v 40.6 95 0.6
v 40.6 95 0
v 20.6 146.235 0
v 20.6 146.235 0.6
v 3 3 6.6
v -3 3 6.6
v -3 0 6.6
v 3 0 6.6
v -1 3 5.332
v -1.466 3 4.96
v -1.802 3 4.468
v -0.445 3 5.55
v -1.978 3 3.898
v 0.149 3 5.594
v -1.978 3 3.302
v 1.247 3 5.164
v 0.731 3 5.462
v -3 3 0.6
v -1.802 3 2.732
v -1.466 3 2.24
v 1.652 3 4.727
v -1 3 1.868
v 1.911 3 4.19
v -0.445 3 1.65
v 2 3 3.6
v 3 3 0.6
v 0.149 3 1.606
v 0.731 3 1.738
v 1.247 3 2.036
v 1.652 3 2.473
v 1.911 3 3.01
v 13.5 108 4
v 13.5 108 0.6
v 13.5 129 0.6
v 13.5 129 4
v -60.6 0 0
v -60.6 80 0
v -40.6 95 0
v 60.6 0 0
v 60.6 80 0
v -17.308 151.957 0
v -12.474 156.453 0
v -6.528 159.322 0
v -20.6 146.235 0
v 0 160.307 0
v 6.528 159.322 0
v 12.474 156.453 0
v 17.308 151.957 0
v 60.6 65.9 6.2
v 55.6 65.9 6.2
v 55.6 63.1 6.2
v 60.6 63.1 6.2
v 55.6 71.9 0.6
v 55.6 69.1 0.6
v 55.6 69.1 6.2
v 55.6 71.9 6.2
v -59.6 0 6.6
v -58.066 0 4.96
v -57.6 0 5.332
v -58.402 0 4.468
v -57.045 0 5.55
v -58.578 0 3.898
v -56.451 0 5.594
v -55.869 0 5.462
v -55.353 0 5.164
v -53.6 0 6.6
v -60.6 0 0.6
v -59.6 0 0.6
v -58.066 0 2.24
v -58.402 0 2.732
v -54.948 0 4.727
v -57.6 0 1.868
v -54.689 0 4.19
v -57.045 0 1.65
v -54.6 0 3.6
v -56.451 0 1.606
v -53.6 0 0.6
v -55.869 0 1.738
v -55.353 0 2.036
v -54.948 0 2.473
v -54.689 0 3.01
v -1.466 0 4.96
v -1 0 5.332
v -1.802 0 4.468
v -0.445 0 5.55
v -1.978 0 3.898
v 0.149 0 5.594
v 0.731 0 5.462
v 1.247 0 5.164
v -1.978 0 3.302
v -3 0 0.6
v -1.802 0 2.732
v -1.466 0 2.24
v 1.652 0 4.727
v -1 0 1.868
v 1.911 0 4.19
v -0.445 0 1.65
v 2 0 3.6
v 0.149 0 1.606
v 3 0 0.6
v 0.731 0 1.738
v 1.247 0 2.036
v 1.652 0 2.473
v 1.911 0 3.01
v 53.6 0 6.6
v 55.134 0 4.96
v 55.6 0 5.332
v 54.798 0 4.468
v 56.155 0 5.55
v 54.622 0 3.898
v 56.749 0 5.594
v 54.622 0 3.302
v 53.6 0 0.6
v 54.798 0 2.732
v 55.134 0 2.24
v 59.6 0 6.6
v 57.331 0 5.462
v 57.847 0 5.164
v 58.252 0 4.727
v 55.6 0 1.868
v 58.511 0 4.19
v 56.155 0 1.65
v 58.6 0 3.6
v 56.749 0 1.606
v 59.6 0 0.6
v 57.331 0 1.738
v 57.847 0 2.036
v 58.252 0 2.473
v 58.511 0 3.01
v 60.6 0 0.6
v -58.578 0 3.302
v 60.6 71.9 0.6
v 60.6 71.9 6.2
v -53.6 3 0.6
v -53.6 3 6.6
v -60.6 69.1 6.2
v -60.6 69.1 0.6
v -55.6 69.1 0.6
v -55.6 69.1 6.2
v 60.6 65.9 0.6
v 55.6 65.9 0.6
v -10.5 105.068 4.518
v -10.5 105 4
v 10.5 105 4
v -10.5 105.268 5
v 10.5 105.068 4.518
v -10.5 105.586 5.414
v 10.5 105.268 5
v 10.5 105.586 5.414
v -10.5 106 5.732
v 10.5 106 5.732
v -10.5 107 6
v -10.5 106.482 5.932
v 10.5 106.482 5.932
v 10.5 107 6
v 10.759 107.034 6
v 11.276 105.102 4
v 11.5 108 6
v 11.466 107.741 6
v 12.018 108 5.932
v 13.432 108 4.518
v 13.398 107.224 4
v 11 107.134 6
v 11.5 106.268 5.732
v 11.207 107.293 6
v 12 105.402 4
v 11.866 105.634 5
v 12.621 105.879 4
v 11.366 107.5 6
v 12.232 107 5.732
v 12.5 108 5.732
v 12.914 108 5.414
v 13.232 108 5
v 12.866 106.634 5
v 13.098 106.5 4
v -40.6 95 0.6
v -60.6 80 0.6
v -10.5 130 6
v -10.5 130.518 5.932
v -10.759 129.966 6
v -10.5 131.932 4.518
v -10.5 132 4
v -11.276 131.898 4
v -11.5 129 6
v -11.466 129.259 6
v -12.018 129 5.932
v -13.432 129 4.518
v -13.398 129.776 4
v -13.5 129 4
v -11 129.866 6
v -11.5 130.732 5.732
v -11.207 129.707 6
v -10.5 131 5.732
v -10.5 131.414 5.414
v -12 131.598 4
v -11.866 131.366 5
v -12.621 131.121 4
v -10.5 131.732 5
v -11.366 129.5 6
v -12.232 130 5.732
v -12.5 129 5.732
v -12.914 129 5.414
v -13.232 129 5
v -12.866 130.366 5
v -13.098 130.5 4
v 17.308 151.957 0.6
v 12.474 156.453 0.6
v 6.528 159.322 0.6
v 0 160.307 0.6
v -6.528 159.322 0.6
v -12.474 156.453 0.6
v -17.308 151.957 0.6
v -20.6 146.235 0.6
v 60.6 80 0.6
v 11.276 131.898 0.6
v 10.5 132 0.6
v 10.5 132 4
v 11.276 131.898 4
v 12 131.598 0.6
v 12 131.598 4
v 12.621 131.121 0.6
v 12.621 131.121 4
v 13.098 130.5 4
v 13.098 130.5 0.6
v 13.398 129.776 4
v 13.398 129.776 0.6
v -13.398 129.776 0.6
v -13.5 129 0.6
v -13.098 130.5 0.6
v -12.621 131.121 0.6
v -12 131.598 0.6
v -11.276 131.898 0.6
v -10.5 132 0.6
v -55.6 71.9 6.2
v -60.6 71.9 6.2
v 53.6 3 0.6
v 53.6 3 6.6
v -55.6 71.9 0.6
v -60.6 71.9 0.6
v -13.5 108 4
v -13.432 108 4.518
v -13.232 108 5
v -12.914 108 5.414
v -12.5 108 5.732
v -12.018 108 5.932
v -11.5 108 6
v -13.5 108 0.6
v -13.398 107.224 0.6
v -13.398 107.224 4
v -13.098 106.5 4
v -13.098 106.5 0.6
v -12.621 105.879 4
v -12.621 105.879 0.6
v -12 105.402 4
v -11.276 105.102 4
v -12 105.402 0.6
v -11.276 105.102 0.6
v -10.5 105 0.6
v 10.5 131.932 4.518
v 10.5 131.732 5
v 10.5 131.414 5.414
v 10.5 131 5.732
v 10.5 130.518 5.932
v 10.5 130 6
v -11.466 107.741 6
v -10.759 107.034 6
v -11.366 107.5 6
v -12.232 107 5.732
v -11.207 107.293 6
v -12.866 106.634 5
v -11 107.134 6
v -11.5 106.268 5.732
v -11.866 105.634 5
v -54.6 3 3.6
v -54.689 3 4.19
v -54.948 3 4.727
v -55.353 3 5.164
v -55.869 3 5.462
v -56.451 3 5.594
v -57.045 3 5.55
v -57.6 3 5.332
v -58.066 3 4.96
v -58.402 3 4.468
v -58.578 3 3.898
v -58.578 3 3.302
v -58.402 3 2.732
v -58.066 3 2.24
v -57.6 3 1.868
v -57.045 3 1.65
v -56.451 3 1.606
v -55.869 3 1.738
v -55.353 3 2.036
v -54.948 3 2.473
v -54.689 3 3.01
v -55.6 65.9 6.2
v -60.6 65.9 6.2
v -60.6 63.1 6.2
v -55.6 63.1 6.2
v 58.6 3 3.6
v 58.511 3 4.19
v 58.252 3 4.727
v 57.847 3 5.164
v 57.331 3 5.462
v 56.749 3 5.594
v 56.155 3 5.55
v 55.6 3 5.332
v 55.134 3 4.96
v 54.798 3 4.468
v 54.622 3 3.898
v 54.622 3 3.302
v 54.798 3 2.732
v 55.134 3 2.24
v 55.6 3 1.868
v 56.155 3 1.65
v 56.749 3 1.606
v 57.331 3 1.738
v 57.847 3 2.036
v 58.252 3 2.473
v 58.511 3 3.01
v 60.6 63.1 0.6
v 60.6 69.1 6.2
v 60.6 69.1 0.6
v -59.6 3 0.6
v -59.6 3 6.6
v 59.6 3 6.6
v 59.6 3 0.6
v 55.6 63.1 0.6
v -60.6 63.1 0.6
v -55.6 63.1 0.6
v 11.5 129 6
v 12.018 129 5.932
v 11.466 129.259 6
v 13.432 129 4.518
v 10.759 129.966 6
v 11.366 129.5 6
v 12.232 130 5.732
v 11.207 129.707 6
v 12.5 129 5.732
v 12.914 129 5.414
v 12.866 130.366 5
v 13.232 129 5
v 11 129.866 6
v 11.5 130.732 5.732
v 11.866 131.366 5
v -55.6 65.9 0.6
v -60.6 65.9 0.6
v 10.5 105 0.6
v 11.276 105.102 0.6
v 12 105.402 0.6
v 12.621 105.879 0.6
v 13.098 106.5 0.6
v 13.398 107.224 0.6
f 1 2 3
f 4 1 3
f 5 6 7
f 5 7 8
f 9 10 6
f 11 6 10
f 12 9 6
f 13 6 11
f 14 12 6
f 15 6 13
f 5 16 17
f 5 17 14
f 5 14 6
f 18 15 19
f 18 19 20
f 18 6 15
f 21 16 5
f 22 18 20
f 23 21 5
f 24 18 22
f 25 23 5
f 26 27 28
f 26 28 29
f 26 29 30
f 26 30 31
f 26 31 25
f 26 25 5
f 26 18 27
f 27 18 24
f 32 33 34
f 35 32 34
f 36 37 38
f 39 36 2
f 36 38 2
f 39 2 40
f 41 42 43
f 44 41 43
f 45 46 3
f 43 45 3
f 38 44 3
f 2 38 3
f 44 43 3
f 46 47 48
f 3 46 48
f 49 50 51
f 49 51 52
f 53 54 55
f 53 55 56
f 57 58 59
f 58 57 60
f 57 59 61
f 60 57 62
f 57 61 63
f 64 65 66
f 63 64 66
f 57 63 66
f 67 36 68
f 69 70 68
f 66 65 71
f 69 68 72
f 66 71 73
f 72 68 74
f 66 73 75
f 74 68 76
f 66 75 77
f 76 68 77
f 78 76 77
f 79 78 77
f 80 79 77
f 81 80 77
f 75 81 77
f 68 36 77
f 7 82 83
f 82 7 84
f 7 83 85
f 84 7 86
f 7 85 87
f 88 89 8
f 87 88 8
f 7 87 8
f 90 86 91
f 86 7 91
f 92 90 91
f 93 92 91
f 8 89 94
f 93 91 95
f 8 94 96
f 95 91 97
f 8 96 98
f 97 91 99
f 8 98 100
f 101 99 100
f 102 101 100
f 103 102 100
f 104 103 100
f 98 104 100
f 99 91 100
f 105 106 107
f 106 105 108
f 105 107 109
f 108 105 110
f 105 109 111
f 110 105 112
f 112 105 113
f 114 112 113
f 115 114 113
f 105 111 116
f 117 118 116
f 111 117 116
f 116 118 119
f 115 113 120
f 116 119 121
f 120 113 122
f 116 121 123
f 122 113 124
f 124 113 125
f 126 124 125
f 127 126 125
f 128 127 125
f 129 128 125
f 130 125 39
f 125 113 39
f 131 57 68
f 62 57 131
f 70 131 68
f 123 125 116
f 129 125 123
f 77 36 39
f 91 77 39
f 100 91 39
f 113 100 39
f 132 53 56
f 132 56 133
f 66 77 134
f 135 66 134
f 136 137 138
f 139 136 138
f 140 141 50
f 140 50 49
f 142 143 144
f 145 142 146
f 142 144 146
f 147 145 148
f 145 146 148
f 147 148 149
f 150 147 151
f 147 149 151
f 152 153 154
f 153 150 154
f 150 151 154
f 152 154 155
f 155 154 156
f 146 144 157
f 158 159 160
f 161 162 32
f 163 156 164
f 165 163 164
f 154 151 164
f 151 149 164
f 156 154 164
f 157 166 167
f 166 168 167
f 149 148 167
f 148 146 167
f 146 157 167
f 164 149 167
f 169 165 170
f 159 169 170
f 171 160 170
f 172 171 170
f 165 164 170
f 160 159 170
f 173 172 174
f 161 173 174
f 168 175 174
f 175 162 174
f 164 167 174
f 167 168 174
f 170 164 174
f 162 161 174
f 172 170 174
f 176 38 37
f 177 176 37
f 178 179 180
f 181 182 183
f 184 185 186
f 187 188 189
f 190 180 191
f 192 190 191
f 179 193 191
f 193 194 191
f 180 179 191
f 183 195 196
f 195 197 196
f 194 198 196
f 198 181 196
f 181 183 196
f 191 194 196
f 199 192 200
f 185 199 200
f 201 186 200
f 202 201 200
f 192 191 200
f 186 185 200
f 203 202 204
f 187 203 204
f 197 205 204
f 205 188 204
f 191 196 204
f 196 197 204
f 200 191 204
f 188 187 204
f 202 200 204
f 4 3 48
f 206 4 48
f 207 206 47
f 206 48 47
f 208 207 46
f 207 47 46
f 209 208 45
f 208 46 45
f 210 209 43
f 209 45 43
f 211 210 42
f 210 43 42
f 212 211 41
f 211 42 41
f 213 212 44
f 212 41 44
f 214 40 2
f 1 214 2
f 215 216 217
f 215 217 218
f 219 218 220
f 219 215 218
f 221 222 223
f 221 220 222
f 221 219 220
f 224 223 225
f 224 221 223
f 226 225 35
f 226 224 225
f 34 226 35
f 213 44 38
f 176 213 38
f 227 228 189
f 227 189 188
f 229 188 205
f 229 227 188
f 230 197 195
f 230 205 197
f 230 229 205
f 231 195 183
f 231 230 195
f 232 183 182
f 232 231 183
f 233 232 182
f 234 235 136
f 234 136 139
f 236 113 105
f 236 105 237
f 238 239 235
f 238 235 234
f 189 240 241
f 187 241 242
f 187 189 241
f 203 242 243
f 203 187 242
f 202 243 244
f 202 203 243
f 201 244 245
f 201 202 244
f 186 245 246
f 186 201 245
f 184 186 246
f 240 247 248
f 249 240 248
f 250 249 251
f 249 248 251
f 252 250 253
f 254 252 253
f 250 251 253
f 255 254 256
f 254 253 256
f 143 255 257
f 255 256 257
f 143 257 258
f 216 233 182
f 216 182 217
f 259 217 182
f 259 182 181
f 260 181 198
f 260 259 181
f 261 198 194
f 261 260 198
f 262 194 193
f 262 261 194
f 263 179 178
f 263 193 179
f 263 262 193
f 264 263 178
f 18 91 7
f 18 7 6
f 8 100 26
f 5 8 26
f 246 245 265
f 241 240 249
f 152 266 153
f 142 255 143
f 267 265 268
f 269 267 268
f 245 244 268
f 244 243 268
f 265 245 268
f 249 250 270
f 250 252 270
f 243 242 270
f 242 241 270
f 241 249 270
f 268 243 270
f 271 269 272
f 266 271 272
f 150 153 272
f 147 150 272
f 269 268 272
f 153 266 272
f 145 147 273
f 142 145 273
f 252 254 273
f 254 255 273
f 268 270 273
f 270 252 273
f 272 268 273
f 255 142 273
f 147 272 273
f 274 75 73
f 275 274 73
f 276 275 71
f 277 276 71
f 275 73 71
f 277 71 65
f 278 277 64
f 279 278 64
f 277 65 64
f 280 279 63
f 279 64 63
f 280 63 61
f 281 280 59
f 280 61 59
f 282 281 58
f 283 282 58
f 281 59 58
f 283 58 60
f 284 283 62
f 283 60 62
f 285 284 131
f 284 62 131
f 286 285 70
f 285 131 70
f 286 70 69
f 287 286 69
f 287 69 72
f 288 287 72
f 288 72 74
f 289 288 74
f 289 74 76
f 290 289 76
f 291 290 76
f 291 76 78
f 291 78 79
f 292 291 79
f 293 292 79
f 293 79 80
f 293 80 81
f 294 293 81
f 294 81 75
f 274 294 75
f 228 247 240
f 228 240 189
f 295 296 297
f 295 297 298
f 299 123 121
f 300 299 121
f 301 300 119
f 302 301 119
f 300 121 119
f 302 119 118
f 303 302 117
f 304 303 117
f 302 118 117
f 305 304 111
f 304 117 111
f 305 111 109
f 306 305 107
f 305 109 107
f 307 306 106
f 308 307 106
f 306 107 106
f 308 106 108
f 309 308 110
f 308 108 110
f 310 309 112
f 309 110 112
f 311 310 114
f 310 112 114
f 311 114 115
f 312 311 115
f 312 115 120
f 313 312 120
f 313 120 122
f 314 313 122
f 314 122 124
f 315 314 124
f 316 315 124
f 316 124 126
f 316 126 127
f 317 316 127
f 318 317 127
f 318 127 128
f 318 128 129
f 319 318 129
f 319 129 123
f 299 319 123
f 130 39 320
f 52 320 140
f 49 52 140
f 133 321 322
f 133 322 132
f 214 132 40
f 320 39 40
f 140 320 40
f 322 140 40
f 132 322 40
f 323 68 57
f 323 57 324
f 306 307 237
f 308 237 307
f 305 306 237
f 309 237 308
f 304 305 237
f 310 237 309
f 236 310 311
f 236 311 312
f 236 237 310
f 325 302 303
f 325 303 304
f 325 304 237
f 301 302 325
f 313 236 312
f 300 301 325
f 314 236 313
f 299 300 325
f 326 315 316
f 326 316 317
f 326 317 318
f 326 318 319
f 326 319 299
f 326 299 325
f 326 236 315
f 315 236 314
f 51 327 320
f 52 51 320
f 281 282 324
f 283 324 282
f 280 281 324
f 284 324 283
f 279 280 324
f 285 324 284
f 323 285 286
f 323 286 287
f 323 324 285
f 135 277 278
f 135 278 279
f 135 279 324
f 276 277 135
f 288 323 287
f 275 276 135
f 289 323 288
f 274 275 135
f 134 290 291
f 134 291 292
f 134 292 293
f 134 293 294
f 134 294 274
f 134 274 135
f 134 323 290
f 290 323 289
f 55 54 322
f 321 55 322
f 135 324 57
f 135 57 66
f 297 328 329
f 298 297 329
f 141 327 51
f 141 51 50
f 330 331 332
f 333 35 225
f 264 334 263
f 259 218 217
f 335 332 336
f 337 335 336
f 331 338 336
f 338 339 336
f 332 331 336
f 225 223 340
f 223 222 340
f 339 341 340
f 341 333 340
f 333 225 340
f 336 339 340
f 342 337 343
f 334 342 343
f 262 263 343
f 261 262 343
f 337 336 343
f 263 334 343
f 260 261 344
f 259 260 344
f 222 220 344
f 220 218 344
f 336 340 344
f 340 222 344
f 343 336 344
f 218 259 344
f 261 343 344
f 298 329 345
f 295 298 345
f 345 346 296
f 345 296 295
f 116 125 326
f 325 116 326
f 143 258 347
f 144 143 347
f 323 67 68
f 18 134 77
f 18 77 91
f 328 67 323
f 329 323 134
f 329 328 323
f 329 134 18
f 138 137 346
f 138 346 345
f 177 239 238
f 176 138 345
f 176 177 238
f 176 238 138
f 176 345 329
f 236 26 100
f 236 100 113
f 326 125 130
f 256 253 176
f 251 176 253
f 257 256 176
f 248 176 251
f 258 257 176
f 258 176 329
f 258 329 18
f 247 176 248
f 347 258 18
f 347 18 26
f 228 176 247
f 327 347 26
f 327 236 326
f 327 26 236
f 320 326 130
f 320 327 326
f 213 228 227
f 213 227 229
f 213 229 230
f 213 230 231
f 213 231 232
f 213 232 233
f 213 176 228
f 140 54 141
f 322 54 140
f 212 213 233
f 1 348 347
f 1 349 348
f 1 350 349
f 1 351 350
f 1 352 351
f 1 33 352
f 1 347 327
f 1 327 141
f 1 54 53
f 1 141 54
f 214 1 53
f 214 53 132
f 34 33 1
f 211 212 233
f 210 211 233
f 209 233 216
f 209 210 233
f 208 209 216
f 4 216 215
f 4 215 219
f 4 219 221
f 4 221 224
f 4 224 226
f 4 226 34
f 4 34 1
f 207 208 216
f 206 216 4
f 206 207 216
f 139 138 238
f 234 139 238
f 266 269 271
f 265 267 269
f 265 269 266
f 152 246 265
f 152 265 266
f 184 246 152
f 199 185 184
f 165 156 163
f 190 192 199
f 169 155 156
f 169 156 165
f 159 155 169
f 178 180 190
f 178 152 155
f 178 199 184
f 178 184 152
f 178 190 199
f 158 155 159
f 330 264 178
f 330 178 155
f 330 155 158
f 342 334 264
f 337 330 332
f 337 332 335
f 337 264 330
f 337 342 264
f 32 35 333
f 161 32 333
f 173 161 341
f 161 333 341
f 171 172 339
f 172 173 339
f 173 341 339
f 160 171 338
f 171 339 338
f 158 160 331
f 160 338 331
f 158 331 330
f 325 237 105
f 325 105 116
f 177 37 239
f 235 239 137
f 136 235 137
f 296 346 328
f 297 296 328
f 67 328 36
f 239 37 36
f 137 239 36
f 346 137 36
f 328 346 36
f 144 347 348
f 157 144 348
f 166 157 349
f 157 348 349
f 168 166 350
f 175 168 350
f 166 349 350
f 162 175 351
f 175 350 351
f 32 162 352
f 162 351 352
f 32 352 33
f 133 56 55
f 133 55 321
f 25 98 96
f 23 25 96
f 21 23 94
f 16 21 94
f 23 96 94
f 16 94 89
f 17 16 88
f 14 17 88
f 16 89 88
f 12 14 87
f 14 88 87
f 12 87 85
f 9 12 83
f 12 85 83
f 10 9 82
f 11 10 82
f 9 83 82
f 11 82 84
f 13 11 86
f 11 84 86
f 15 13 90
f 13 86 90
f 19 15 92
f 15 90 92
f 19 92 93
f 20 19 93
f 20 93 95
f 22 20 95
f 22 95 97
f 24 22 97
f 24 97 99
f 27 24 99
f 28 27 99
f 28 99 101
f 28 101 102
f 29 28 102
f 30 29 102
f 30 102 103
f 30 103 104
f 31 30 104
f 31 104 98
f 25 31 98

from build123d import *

# Parameters (mm, degrees)
F0_W         = 27
F0_H         = 27
F1_DEPTH     = 0.6
F2_DEPTH     = 6
F3_R         = 2
F4_T1_DEPTH  = 5.4
F4_T4_ANGLE  = 90
F4_T6_ANGLE  = 90
F4_T8_ANGLE  = 90
F4_T10_ANGLE = 90
F5_W         = 5
F5_H         = 2.8
F6_DEPTH     = 5.6
F7_W         = 6
F7_H         = 3
F8_DEPTH     = 6
F9_R         = 2
F10_DEPTH    = 4


# Not quite as in the source:
# - a fillet or chamfer that OpenCascade refuses, or shapes differently, is made with other operations: its cross-section is extruded or revolved along the edge and cut away or added


with BuildPart() as f1:
    # F0 (on Top) → F1 (new body)
    with BuildSketch(Plane.XY):
        with BuildLine():
            Line((-40.6, 95), (-60.6, 80))
            Line((-60.6, 80), (-60.6, 0))
            Line((-60.6, 0), (60.6, 0))
            Line((60.6, 0), (60.6, 80))
            Line((60.6, 80), (40.6, 95))
            Line((40.6, 95), (20.6, 146.2347538298))
            ThreePointArc((20.6, 146.2347538298), (0, 160.3072328817), (-20.6, 146.2347538298))
            Line((-20.6, 146.2347538298), (-40.6, 95))
        make_face()
        with Locations((0, 118.5)):
            Rectangle(F0_W, F0_H, mode=Mode.SUBTRACT)
        with Locations((0, 118.5)):
            Rectangle(F0_W, F0_H)
    extrude(amount=F1_DEPTH)

    # F0 (on Top) → F2 (join)
    with BuildSketch(Plane.XY):
        with Locations((0, 118.5)):
            Rectangle(F0_W, F0_H)
    extrude(amount=F2_DEPTH)

    # F3
    f3_edges = [f1.edges().sort_by_distance(p)[0] for p in [
        (0, 132, 6),
        (-13.5, 118.5, 6),
        (0, 105, 6),
        (13.5, 118.5, 6),
    ]]
    fillet(f3_edges, radius=F3_R)

    # F4: fillet of radius 3 on 4 edges, made by hand

    # F4_s2 → F4_t1 (cut)
    with BuildSketch(Plane.XY.offset(0.6)):
        with BuildLine():
            ThreePointArc((-13.5, 129), (-12.6213203436, 131.1213203436), (-10.5, 132))
            Line((-10.5, 132), (-13.5, 132))
            Line((-13.5, 132), (-13.5, 129))
        make_face()
        with BuildLine():
            ThreePointArc((-13.5, 108), (-12.6213203436, 105.8786796564), (-10.5, 105))
            Line((-10.5, 105), (-13.5, 105))
            Line((-13.5, 105), (-13.5, 108))
        make_face()
        with BuildLine():
            ThreePointArc((10.5, 105), (12.6213203436, 105.8786796564), (13.5, 108))
            Line((13.5, 108), (13.5, 105))
            Line((13.5, 105), (10.5, 105))
        make_face()
        with BuildLine():
            ThreePointArc((10.5, 132), (12.6213203436, 131.1213203436), (13.5, 129))
            Line((13.5, 129), (13.5, 132))
            Line((13.5, 132), (10.5, 132))
        make_face()
    extrude(amount=F4_T1_DEPTH, mode=Mode.SUBTRACT)

    # F4_s3 → F4_t4 (revolve, cut)
    with BuildSketch(Plane.XZ.offset(-129)):
        with BuildLine():
            ThreePointArc((11.5, 6), (12.9142135624, 5.4142135624), (13.5, 4))
            Line((13.5, 4), (13.5, 6))
            Line((13.5, 6), (11.5, 6))
        make_face()
    revolve(axis=Axis((10.5, 129, 6), (0, 0, 1)), revolution_arc=F4_T4_ANGLE, mode=Mode.SUBTRACT)

    # F4_s5 → F4_t6 (revolve, cut)
    with BuildSketch(Plane.YZ.offset(10.5)):
        with BuildLine():
            ThreePointArc((107, 6), (105.5857864376, 5.4142135624), (105, 4))
            Line((105, 4), (105, 6))
            Line((105, 6), (107, 6))
        make_face()
    revolve(axis=Axis((10.5, 108, 6), (0, 0, 1)), revolution_arc=F4_T6_ANGLE, mode=Mode.SUBTRACT)

    # F4_s7 → F4_t8 (revolve, cut)
    with BuildSketch(Plane.XZ.offset(-108)):
        with BuildLine():
            ThreePointArc((-11.5, 6), (-12.9142135624, 5.4142135624), (-13.5, 4))
            Line((-13.5, 4), (-13.5, 6))
            Line((-13.5, 6), (-11.5, 6))
        make_face()
    revolve(axis=Axis((-10.5, 108, 6), (0, 0, 1)), revolution_arc=F4_T8_ANGLE, mode=Mode.SUBTRACT)

    # F4_s9 → F4_t10 (revolve, cut)
    with BuildSketch(Plane.YZ.offset(-10.5)):
        with BuildLine():
            ThreePointArc((130, 6), (131.4142135624, 5.4142135624), (132, 4))
            Line((132, 4), (132, 6))
            Line((132, 6), (130, 6))
        make_face()
    revolve(axis=Axis((-10.5, 129, 6), (0, 0, 1)), revolution_arc=F4_T10_ANGLE, mode=Mode.SUBTRACT)

    # F5 (on face) → F6 (join)
    with BuildSketch(Plane.XY.offset(0.6)):
        with Locations((-58.1, 70.5)):
            Rectangle(F5_W, F5_H)
        with Locations((-58.1, 64.5)):
            Rectangle(F5_W, F5_H)
        with Locations((58.1, 70.5)):
            Rectangle(F5_W, F5_H)
        with Locations((58.1, 64.5)):
            Rectangle(F5_W, F5_H)
    extrude(amount=F6_DEPTH)

    # F7 (on face) → F8 (join)
    with BuildSketch(Plane.XY.offset(0.6)):
        with Locations((-56.6, 1.5)):
            Rectangle(F7_W, F7_H)
        with Locations((56.6, 1.5)):
            Rectangle(F7_W, F7_H)
        with Locations((0, 1.5)):
            Rectangle(F7_W, F7_H)
    extrude(amount=F8_DEPTH)

    # F9 (on face) → F10 (cut)
    with BuildSketch(Plane.XZ):
        with Locations((56.6, 3.6)):
            Circle(F9_R)
        with Locations((-56.6, 3.6)):
            Circle(F9_R)
        with Locations((0, 3.6)):
            Circle(F9_R)
    extrude(amount=-F10_DEPTH, mode=Mode.SUBTRACT)


solid = f1.part
